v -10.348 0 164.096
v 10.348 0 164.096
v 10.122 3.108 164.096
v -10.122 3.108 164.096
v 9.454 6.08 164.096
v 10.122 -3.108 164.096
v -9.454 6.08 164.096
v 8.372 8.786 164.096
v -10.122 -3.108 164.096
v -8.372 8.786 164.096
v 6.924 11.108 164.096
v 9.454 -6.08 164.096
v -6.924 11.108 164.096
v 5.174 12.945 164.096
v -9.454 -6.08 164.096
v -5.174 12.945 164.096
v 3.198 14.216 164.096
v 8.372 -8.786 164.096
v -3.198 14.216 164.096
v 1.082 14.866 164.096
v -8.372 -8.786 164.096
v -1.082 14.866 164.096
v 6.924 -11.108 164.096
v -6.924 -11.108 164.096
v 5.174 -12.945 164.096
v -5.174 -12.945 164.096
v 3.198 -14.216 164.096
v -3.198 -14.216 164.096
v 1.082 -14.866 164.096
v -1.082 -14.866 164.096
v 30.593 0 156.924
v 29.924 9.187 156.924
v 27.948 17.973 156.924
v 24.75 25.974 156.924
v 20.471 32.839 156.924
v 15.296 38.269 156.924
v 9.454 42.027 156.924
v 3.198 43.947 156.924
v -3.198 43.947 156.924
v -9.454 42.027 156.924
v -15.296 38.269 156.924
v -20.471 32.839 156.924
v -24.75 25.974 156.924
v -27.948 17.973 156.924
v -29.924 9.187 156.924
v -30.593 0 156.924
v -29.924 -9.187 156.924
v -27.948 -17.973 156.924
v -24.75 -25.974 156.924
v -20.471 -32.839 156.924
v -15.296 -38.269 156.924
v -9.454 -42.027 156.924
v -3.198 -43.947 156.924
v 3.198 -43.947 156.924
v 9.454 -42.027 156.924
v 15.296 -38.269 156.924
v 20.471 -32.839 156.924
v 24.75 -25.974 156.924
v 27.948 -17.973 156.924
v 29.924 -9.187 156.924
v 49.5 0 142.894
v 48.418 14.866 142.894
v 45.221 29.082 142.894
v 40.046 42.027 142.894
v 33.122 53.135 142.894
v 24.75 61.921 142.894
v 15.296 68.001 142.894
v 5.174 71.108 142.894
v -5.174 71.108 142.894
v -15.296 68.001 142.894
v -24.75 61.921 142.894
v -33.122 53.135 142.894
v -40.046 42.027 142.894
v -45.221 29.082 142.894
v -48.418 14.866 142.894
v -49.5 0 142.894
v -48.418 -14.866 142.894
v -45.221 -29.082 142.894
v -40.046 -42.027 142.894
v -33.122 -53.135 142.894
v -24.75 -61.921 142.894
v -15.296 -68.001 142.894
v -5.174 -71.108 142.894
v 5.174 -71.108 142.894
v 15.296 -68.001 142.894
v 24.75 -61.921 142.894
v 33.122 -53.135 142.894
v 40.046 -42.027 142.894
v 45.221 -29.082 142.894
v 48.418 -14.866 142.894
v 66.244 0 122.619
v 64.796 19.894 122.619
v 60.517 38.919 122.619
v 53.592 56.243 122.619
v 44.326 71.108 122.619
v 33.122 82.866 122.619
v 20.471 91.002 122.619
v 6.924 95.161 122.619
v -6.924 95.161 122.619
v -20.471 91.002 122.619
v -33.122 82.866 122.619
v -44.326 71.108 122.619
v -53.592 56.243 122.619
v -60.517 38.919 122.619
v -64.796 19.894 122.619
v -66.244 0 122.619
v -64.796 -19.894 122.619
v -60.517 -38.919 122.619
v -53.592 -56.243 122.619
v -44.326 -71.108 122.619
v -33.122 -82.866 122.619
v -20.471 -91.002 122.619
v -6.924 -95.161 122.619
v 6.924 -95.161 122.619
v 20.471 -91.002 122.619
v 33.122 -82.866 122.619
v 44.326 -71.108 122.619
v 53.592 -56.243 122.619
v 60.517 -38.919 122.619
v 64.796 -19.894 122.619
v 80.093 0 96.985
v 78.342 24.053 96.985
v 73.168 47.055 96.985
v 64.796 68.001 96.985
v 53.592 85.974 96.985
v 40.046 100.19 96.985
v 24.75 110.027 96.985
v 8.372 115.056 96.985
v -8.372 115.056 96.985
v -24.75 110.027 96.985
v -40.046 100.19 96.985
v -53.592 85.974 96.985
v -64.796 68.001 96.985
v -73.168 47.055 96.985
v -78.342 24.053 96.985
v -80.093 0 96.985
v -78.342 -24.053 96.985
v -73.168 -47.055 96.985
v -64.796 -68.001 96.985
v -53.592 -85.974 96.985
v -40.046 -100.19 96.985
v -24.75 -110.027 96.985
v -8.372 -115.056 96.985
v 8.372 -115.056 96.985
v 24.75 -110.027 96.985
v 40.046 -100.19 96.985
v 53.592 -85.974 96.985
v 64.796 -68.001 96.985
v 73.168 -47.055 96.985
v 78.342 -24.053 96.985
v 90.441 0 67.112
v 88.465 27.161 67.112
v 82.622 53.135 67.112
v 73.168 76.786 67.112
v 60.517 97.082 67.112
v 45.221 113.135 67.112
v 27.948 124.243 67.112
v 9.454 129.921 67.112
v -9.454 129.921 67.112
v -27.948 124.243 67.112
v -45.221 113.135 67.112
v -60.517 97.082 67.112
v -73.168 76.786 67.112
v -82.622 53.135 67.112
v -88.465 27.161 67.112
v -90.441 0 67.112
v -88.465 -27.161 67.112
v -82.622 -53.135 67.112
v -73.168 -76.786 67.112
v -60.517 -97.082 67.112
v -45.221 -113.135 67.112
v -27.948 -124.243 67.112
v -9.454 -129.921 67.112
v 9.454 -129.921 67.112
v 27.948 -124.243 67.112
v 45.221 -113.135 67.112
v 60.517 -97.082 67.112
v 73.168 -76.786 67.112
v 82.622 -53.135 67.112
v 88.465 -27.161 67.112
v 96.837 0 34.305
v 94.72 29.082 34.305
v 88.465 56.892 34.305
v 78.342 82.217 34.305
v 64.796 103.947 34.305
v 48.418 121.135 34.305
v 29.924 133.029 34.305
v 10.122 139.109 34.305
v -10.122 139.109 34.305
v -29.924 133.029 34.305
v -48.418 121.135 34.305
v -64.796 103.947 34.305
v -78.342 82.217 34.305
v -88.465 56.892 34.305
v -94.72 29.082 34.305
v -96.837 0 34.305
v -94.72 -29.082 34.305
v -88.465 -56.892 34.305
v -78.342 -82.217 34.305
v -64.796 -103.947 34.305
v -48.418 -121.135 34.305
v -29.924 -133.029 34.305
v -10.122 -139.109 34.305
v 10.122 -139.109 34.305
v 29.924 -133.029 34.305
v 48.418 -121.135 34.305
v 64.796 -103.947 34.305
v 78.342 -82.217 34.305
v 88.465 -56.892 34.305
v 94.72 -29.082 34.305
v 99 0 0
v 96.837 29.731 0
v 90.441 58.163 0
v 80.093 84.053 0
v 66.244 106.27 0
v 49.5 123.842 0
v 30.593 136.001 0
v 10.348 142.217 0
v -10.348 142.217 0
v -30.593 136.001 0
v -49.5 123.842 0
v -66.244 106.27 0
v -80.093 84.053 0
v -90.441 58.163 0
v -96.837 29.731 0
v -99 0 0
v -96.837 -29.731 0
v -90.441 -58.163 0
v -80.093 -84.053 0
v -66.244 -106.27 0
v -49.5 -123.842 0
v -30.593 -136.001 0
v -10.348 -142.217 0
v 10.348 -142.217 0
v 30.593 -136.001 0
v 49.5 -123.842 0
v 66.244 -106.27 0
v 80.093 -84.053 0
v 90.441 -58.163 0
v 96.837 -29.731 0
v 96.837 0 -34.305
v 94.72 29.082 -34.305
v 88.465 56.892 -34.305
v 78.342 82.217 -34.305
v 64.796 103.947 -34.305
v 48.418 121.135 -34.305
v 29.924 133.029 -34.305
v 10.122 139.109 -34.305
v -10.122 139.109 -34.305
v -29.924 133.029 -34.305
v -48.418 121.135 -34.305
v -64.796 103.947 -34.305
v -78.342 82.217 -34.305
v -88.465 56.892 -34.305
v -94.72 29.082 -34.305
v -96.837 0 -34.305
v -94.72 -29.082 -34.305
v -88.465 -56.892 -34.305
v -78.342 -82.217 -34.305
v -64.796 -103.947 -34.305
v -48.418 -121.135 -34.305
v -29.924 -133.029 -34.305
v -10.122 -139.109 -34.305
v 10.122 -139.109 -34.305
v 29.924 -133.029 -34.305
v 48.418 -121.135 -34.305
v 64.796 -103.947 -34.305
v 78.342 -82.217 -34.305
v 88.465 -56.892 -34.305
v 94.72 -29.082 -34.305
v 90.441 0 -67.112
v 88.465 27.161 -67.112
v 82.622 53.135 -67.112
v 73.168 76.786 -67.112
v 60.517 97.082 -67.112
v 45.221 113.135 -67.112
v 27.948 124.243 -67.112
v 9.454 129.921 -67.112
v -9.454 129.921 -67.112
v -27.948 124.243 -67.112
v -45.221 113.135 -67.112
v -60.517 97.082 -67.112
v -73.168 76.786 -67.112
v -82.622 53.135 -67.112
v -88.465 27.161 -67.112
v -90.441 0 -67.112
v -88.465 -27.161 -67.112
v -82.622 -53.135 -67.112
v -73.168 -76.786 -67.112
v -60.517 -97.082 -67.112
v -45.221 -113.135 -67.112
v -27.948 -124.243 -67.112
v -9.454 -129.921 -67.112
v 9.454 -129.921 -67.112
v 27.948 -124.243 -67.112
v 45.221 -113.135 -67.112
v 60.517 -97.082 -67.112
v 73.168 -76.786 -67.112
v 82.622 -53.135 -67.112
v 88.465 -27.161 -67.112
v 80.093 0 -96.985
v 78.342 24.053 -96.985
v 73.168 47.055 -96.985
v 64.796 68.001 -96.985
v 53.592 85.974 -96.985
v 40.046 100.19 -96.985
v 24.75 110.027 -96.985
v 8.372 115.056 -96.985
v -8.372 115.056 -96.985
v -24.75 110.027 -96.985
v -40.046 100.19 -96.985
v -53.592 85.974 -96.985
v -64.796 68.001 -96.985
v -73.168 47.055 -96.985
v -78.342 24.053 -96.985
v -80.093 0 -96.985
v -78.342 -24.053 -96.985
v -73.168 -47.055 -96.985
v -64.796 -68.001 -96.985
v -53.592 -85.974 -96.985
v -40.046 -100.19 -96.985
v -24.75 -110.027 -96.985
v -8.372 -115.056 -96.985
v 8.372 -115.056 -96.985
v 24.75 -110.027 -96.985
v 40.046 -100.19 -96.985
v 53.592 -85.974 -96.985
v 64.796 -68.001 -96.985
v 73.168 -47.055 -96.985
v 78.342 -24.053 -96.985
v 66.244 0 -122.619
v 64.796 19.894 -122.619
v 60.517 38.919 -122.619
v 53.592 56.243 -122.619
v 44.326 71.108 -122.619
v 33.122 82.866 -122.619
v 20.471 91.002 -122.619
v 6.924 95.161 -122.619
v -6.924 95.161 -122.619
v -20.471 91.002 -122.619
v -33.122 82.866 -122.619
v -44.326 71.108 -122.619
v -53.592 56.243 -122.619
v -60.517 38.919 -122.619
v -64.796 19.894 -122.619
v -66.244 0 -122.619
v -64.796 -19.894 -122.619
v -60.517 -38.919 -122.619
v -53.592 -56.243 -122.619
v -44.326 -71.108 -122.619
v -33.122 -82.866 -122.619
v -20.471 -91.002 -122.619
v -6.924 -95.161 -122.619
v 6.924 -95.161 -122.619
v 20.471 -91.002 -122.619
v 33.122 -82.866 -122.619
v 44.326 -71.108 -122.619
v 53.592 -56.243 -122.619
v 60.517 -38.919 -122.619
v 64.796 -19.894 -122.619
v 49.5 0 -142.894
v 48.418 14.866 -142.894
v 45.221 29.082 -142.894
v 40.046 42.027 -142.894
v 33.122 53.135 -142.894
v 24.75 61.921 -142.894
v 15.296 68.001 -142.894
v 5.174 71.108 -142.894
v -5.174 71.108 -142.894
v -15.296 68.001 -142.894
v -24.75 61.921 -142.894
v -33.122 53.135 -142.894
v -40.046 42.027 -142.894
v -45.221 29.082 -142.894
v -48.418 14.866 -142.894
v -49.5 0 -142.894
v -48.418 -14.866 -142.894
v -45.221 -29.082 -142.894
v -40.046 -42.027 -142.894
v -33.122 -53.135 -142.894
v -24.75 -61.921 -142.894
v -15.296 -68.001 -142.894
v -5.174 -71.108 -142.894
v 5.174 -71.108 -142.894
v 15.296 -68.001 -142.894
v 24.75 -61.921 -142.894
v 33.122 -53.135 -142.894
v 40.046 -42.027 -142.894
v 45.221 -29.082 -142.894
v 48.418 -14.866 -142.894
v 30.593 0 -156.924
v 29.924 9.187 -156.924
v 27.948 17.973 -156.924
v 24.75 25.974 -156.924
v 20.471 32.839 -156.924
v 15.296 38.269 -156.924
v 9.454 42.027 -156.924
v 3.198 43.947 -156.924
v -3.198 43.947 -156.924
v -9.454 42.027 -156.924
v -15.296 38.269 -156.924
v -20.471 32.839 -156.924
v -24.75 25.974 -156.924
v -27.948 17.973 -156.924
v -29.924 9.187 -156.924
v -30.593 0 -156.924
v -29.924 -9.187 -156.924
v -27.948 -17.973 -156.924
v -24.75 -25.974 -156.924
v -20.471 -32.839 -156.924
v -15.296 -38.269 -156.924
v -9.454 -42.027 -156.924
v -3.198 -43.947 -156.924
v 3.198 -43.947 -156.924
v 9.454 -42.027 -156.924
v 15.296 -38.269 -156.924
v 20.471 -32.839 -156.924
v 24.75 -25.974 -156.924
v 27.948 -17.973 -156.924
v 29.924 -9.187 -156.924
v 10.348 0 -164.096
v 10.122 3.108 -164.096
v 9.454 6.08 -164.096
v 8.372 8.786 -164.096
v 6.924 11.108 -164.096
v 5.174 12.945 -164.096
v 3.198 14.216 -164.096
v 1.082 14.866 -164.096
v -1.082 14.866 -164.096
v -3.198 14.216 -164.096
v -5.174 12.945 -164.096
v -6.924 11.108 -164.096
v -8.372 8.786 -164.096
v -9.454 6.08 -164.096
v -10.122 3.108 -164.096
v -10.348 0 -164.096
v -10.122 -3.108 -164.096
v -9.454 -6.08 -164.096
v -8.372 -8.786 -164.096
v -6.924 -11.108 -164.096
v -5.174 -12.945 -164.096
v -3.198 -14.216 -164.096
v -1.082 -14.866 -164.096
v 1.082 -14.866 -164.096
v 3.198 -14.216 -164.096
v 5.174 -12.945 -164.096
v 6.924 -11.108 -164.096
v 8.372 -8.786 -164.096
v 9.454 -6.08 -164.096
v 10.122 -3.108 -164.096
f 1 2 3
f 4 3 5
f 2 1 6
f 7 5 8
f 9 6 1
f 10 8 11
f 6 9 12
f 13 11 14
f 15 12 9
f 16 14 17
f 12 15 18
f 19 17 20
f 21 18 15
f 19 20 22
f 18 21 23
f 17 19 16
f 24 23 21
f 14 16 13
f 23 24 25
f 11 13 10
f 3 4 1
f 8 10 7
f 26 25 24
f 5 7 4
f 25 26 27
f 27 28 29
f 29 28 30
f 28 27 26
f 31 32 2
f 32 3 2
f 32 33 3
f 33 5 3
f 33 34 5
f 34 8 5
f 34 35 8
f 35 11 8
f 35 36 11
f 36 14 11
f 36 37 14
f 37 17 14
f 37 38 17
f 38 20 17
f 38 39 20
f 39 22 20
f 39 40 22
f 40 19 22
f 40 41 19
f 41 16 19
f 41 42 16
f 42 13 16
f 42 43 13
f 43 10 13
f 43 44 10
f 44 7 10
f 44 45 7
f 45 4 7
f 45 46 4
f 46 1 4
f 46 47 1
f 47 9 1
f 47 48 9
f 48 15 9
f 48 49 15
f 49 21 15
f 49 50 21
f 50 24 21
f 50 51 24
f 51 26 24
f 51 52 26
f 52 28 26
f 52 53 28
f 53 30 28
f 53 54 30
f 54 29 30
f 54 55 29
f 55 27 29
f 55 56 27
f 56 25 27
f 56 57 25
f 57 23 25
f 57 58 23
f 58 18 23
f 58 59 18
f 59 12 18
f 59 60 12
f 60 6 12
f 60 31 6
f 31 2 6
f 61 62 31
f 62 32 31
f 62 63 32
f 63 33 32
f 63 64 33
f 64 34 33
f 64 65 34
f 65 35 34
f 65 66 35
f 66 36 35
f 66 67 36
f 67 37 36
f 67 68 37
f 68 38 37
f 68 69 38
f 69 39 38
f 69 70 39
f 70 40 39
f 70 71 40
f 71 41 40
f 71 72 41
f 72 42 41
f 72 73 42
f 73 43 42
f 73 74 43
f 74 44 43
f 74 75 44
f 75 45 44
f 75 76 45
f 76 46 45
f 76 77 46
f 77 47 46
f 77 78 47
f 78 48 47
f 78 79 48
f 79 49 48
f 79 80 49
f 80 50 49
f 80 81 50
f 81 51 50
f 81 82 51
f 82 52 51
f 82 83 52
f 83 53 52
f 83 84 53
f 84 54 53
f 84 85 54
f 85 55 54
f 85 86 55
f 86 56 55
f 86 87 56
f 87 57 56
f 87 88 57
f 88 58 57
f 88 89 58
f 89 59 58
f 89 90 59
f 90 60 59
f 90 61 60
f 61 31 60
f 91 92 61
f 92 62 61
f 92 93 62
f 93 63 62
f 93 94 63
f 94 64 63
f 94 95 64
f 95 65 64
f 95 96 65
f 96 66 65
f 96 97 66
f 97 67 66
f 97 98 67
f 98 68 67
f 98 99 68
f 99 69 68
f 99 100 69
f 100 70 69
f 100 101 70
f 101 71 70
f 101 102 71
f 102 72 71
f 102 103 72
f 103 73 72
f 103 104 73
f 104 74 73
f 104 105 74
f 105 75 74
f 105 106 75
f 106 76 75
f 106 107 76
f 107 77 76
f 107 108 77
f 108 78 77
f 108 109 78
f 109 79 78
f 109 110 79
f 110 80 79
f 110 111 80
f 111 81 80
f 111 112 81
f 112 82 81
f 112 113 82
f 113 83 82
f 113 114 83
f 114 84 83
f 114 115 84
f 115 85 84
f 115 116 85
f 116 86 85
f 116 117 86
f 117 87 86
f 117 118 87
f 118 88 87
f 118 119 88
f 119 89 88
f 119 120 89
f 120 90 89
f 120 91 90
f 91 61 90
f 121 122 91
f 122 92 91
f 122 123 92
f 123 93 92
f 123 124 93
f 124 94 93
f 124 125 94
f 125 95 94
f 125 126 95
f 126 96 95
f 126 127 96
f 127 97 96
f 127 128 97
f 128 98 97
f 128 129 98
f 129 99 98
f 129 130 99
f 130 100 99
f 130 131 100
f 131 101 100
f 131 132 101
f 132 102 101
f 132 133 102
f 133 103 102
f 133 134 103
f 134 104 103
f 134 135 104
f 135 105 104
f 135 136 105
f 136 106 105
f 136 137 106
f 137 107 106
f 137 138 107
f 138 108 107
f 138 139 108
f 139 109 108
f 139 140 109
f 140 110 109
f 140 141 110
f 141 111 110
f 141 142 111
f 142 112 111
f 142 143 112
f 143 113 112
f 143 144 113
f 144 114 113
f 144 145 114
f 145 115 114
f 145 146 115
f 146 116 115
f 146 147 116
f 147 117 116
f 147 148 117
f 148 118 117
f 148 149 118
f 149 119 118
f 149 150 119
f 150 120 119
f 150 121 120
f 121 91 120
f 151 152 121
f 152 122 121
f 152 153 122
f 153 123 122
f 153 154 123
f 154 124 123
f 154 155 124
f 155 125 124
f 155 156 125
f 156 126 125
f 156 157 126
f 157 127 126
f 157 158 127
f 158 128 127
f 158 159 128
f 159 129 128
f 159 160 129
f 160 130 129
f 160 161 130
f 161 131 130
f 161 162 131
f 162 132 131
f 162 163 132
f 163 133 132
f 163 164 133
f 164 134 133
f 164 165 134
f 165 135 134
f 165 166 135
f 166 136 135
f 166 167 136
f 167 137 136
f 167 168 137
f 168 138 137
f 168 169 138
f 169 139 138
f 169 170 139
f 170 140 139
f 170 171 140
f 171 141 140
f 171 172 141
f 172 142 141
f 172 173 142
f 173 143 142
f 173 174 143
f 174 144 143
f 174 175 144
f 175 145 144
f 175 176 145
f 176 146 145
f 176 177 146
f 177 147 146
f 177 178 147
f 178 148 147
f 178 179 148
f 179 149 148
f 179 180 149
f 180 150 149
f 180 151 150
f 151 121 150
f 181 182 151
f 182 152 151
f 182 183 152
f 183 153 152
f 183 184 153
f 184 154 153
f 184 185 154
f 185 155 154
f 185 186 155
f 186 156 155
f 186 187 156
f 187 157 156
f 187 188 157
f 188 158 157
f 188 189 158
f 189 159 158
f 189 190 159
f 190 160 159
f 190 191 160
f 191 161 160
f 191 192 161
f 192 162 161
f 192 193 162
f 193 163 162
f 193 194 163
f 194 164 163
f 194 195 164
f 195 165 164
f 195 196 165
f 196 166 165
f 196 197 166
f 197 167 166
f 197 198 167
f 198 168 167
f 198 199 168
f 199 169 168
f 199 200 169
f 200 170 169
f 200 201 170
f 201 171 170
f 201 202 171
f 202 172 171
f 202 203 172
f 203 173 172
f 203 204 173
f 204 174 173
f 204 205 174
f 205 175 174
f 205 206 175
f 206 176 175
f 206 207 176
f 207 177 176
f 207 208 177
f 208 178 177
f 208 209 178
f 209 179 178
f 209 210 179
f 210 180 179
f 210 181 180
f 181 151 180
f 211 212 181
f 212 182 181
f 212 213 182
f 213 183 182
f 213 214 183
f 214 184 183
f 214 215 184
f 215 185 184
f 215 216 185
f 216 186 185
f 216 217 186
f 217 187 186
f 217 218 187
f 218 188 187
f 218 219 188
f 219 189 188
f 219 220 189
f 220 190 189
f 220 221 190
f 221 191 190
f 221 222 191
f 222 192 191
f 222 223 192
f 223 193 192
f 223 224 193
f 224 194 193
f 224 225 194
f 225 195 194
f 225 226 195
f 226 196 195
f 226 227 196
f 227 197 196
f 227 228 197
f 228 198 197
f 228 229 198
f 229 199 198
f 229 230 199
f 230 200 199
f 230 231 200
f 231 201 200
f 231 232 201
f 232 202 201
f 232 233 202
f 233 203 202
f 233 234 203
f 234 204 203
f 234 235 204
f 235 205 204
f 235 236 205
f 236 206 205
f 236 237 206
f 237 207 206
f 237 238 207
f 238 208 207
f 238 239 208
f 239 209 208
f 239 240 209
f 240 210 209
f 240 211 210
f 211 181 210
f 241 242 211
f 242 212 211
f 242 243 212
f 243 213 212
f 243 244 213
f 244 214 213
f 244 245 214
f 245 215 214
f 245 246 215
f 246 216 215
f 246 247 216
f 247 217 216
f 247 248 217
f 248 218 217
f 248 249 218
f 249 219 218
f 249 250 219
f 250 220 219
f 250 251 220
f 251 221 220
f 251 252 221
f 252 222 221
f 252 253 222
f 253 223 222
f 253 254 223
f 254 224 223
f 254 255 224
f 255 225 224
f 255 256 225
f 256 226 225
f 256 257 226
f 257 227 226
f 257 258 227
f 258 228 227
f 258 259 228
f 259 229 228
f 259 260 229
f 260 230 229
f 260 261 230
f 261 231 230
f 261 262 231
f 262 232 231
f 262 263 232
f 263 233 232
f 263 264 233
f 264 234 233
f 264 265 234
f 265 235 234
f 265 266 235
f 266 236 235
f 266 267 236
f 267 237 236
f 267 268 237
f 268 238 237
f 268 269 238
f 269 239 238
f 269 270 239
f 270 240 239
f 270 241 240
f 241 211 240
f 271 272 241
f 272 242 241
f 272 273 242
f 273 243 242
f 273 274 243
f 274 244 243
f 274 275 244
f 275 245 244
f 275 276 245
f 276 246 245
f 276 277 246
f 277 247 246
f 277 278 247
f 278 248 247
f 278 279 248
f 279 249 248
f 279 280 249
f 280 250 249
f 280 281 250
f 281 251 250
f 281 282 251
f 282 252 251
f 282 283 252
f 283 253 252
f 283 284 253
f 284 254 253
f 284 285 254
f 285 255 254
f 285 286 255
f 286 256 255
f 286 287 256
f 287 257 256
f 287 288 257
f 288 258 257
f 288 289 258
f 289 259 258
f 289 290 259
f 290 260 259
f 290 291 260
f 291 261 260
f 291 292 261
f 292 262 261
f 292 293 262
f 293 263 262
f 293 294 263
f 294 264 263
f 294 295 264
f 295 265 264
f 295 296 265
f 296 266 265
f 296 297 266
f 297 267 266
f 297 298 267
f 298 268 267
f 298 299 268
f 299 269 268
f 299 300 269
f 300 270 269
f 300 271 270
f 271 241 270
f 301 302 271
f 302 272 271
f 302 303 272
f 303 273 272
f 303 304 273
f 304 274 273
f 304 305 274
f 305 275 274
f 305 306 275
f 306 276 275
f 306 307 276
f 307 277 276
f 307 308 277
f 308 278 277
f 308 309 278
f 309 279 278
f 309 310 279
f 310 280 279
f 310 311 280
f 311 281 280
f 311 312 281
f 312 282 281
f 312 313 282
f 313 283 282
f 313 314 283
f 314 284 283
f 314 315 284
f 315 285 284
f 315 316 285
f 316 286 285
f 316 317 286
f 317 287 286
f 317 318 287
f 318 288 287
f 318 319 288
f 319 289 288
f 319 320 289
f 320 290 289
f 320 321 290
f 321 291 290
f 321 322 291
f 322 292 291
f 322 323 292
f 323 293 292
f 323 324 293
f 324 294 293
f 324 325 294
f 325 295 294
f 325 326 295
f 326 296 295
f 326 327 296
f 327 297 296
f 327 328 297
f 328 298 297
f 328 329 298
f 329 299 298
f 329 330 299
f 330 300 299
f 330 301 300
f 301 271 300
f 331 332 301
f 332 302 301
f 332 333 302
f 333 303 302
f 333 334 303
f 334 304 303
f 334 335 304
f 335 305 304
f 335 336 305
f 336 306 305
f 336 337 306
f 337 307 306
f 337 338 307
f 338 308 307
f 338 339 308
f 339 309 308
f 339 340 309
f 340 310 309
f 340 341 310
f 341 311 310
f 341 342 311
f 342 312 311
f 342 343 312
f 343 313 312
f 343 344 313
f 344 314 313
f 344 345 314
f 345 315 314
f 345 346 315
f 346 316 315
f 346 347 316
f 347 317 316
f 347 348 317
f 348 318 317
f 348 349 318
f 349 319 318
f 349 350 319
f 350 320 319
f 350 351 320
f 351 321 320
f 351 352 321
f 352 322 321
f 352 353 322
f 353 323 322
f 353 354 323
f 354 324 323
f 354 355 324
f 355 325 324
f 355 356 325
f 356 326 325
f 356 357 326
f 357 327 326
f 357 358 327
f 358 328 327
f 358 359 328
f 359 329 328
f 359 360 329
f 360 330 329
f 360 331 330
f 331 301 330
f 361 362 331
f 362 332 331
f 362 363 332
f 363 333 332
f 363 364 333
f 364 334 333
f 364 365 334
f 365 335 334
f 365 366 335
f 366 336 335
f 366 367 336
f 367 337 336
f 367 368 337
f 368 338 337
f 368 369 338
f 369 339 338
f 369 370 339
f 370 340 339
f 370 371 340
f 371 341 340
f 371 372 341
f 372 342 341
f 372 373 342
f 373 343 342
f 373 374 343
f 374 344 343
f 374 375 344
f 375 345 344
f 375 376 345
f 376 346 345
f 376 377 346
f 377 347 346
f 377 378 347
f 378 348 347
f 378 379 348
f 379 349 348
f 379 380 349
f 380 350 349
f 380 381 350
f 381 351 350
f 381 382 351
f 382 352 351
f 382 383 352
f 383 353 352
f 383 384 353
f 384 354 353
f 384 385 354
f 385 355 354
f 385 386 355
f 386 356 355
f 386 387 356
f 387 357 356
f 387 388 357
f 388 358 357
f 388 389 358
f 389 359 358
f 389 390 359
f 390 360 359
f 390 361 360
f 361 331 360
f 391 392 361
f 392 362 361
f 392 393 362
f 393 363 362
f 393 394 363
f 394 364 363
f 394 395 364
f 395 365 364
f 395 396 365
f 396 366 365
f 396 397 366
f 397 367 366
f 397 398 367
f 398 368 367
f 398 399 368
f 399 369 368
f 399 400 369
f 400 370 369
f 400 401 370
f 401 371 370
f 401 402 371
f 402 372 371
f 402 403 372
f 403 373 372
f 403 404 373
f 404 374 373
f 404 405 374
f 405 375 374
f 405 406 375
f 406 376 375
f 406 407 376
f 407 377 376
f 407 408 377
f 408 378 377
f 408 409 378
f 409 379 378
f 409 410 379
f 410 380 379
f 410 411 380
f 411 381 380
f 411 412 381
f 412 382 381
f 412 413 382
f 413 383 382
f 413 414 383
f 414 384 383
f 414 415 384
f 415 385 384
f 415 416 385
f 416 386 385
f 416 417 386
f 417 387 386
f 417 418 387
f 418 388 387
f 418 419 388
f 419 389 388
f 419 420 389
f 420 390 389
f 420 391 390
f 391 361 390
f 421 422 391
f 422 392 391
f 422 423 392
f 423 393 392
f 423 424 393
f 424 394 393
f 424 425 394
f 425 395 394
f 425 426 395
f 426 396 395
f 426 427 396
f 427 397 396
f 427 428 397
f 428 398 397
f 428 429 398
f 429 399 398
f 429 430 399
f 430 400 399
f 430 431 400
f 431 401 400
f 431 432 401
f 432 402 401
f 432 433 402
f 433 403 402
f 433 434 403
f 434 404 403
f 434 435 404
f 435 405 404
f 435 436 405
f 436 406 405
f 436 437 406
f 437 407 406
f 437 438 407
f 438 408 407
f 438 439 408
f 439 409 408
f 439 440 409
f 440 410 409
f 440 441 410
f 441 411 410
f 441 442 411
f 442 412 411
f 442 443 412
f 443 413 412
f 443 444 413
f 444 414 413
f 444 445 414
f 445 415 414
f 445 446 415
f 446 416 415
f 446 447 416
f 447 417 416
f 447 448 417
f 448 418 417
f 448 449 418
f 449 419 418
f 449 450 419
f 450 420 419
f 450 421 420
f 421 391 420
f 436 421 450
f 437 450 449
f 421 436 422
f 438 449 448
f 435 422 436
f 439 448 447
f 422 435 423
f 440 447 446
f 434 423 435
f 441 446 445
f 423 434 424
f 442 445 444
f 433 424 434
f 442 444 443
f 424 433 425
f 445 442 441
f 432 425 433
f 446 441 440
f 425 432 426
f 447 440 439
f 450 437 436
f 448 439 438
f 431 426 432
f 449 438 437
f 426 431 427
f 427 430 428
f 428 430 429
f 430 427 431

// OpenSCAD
// Generated by SolidPython 1.0.1 on 2020-07-29 00:46:49


scale(v = [9, 13, 15]) {
	sphere(r = 11);
}
/***********************************************
*********      SolidPython code:      **********
************************************************
 
# import packages: SolidPython
from solid import *
from solid.utils import *
from itertools import chain, combinations, permutations


class Resize:

    def __init__(self, scad_file):
        self.scad_file = scad_file
        #self.scad_file = import_scad(scad_file)
        # cone/cylinder param:
        self.r1 = 0
        self.r2 = 0
        self.h = 0
        # rectangular prism param:
        self.w = 0
        self.l = 0
        # ellipse param:
        self.r = 0

    # import OpenScad code (file name corresponds to shape)


    # classify shape + parameters
    def assign(self, param1, param2, param3):
        if self.scad_file == 'cone.scad':
            self.r1 = param1
            self.r2 = param2
            self.h = param3
        elif self.scad_file == 'cylinder.scad':
            self.r1 = param1
            self.r2 = param2
            self.h = param3
        elif self.scad_file == 'rectangularPrism.scad':
            self.h = param1
            self.l = param2
            self.w = param3
        else:
            self.r = param1
            self.h = param2

    # resize parameters
    def iterate(self):
        x = range(3, 20, 2)
        i = 1
        if self.scad_file == 'cone.scad':
            tempList = list(permutations(x, 2))
            for temp in tempList:
                param1 = temp[0]
                param2 = temp[1]
                filepath = 'produced_scad_files/' + 'cone' + str(param1) + '_' + str(param2) + '_' + '.scad'
                scad_render_to_file(cylinder(h=param1, r1=param2, r2=0), filepath)

        elif self.scad_file == 'cylinder.scad':
            tempList = list(permutations(x, 3))
            for temp in tempList:
                param1 = temp[0]
                param2 = temp[1]
                filepath = 'produced_scad_files/' + 'cylinder' + str(param1) + '_' + str(param2) + '_' + '.scad'
                scad_render_to_file(cylinder(h=param1, r1=param2, r2=param2), filepath)

        elif self.scad_file == 'rectangularPrism.scad':
            tempList = list(permutations(x, 3))
            for temp in tempList:
                param1 = temp[0]
                param2 = temp[1]
                param3 = temp[2]
                filepath = 'produced_scad_files/' + 'rectangularPrism' + str(param1) + '_' + str(param2) + '_' + str(
                    param3) + '.scad'
                scad_render_to_file(cube(size=(param1, param2, param3)), filepath)

        elif self.scad_file == 'ellipse.scad':
            tempList = list(permutations(x, 4))
            for temp in tempList:
                param1 = temp[0]
                param2 = temp[1]
                param3 = temp[2]
                param4 = temp[3]
                filepath = 'produced_scad_files/' + 'ellipse' + str(param1) + '_' + str(param2) + '_' + str(param3) + '_' + str(param4) + '.scad'
                scad_render_to_file(scale([param1, param2, param3])(sphere(r=param4)), filepath)

    def render_to_scadfile(self):
        scad_render_to_file(scad, 'example.scad') 
 
************************************************/
